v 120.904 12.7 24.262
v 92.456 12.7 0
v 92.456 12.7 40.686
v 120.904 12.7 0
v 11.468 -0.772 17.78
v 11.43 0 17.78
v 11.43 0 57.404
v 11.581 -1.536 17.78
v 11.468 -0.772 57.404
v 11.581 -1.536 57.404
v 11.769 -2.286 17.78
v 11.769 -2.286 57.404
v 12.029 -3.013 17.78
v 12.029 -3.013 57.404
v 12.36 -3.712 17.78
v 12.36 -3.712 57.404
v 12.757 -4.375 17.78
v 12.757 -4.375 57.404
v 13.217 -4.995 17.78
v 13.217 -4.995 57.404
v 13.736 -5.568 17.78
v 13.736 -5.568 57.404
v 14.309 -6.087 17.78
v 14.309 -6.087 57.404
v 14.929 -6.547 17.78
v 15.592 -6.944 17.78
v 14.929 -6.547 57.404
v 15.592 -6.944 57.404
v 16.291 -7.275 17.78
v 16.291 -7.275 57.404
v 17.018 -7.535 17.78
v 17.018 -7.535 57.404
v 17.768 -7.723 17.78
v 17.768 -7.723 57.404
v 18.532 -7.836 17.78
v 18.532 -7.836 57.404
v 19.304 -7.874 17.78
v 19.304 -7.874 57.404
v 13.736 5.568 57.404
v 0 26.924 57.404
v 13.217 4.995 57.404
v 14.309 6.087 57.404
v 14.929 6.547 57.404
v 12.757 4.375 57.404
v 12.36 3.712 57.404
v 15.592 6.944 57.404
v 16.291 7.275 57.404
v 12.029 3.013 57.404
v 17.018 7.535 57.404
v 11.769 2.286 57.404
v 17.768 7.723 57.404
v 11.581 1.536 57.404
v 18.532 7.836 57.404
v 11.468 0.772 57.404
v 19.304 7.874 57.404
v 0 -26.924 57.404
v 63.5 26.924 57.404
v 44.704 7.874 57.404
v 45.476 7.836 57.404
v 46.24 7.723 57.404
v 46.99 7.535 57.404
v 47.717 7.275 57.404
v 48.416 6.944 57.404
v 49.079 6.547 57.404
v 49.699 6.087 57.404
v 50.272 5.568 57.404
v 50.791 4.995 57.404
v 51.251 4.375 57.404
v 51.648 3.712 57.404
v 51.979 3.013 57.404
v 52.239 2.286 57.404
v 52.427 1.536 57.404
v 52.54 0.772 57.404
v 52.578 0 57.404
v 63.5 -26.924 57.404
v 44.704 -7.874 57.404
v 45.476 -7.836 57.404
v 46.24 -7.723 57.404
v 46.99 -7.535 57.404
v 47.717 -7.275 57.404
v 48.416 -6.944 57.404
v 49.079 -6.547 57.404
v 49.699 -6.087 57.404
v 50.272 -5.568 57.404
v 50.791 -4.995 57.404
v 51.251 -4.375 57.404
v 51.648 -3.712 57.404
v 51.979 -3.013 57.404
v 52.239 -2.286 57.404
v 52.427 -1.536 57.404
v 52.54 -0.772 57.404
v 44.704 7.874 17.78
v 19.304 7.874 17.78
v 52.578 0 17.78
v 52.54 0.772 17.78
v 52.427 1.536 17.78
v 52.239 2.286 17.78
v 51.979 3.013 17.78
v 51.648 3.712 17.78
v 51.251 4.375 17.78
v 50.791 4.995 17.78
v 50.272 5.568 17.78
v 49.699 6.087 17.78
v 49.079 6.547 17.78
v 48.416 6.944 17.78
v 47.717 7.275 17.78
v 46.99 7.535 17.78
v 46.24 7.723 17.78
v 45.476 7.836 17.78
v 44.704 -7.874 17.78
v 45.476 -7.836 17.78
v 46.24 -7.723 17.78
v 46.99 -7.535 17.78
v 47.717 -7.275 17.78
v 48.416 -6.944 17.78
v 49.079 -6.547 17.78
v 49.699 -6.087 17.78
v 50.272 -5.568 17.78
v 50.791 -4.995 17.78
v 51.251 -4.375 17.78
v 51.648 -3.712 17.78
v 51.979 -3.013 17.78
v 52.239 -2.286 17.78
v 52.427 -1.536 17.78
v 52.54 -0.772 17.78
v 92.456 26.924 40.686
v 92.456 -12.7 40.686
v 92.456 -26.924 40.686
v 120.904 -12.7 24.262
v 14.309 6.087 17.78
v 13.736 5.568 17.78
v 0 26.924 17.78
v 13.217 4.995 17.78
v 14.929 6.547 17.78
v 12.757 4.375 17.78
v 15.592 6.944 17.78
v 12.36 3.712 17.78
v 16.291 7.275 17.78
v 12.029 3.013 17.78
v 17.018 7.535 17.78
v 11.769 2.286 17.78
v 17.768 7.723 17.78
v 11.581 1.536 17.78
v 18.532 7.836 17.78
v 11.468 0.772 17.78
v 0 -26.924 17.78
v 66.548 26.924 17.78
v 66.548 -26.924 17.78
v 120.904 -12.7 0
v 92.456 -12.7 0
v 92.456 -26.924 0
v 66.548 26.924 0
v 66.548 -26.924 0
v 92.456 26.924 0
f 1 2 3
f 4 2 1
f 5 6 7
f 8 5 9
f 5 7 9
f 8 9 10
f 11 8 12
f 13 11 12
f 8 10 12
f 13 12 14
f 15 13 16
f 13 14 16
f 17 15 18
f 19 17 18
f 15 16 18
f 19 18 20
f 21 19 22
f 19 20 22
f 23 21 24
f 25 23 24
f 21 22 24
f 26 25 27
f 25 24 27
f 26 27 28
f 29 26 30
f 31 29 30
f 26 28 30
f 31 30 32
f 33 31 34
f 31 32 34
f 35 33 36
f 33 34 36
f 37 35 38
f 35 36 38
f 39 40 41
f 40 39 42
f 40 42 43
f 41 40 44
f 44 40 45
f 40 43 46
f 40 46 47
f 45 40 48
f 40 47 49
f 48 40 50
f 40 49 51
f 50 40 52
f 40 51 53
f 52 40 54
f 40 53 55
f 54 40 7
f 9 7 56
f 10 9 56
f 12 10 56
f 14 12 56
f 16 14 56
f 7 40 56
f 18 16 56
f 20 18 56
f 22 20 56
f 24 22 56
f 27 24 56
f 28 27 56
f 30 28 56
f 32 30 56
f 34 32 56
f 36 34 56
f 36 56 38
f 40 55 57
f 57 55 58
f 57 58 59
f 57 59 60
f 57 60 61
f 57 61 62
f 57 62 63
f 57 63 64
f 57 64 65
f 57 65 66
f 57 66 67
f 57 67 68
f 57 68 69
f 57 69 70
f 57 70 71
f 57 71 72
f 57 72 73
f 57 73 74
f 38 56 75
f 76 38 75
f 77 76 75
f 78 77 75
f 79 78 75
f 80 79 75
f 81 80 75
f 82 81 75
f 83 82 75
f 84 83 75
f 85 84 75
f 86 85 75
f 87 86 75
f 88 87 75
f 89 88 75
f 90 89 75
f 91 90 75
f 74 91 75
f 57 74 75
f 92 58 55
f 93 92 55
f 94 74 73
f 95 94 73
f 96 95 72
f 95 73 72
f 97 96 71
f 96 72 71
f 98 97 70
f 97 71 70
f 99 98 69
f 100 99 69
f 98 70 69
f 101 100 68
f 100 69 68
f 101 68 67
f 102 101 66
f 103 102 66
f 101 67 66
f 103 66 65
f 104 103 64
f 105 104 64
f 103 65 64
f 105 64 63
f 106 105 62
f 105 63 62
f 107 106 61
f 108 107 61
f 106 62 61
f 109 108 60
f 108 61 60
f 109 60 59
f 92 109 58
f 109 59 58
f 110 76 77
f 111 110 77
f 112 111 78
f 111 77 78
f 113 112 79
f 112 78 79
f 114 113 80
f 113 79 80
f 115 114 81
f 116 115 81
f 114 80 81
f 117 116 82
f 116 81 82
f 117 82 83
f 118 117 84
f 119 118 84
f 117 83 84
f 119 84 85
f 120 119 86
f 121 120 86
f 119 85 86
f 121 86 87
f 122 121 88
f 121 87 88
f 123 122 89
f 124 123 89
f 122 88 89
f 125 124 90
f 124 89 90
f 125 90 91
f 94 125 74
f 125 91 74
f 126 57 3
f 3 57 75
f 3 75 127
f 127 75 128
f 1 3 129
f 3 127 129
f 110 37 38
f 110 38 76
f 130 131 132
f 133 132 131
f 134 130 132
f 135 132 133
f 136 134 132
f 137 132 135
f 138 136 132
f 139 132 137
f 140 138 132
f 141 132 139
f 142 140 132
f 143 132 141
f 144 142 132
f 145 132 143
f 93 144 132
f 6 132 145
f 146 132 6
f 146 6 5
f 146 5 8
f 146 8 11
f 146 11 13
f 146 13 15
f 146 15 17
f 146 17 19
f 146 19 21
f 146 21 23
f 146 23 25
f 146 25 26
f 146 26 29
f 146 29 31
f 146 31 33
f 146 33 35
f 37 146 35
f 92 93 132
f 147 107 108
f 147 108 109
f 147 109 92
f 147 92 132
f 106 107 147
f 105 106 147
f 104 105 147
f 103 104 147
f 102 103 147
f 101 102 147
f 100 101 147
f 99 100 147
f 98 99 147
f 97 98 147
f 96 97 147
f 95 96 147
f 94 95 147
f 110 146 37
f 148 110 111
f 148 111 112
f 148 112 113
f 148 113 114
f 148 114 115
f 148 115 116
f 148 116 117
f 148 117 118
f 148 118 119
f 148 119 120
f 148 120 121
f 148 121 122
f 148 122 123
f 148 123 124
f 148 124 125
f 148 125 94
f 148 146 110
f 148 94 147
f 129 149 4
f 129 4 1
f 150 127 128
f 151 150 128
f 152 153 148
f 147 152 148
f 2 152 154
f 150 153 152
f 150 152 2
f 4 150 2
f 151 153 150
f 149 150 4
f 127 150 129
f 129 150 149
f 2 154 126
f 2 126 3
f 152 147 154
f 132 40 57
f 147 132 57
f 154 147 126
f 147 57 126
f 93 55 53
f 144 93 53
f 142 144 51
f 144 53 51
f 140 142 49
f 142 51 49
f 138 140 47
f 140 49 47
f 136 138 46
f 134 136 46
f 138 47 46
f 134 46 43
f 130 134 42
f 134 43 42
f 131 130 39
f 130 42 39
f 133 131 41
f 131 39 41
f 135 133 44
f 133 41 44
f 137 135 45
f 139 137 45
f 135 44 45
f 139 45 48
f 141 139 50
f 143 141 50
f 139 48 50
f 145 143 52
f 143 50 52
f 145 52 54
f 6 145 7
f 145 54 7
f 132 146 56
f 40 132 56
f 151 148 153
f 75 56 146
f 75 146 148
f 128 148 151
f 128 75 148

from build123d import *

# Parameters (mm, degrees)
F0_W     = 120.904
F0_H     = 57.404
F1_DEPTH = 26.924
F2_W     = 66.548
F2_H     = 17.78
F3_DEPTH = 53.849
F4_W     = 28.448
F4_H     = 14.224
F5_DEPTH = 57.405
F7_DEPTH = 57.405


with BuildPart() as f1:
    # F0 (on Front) → F1 (new body, symmetric)
    with BuildSketch(Plane.XZ):
        with Locations((60.452, 28.702)):
            Rectangle(F0_W, F0_H)
    extrude(amount=F1_DEPTH, both=True)

    # F2 (on face) → F3 (cut, through all)
    with BuildSketch(Plane.XZ.offset(26.924)):
        with Locations((33.274, 8.89)):
            Rectangle(F2_W, F2_H)
        Polygon((63.5, 57.404), (120.904, 24.2617851474), (120.904, 57.404), align=None)
    extrude(amount=-F3_DEPTH, mode=Mode.SUBTRACT)

    # F4 (on face) → F5 (cut, through all)
    with BuildSketch(Plane(origin=(0, 0, 0), x_dir=(1, 0, 0), z_dir=(0, 0, -1))):
        with Locations((106.68, 19.812)):
            Rectangle(F4_W, F4_H)
        with Locations((106.68, -19.812)):
            Rectangle(F4_W, F4_H)
    extrude(amount=-F5_DEPTH, mode=Mode.SUBTRACT)

    # F6 (on face) → F7 (cut, through all)
    with BuildSketch(Plane.XY.offset(57.404)):
        with BuildLine():
            ThreePointArc((27.178, 0), (24.8717587951, -5.5677587951), (19.304, -7.874))
            Line((19.304, -7.874), (44.704, -7.874))
            ThreePointArc((44.704, -7.874), (39.1362412049, -5.5677587951), (36.83, 0))
            Line((36.83, 0), (27.178, 0))
        make_face()
        with BuildLine():
            Line((44.704, 7.874), (19.304, 7.874))
            ThreePointArc((19.304, 7.874), (24.8717587951, 5.5677587951), (27.178, 0))
            Line((27.178, 0), (36.83, 0))
            ThreePointArc((36.83, 0), (39.1362412049, 5.5677587951), (44.704, 7.874))
        make_face()
        with BuildLine():
            ThreePointArc((19.304, 7.874), (13.7362412049, 5.5677587951), (11.43, 0))
            Line((11.43, 0), (19.304, 0))
            Line((19.304, 0), (27.178, 0))
            ThreePointArc((27.178, 0), (24.8717587951, 5.5677587951), (19.304, 7.874))
        make_face()
        with BuildLine():
            Line((19.304, 0), (11.43, 0))
            ThreePointArc((11.43, 0), (13.7362412049, -5.5677587951), (19.304, -7.874))
            ThreePointArc((19.304, -7.874), (24.8717587951, -5.5677587951), (27.178, 0))
            Line((27.178, 0), (19.304, 0))
        make_face()
        with BuildLine():
            ThreePointArc((52.578, 0), (50.2717587951, 5.5677587951), (44.704, 7.874))
            ThreePointArc((44.704, 7.874), (39.1362412049, 5.5677587951), (36.83, 0))
            ThreePointArc((36.83, 0), (39.1362412049, -5.5677587951), (44.704, -7.874))
            ThreePointArc((44.704, -7.874), (50.2717587951, -5.5677587951), (52.578, 0))
        make_face()
    extrude(amount=-F7_DEPTH, mode=Mode.SUBTRACT)


solid = f1.part
